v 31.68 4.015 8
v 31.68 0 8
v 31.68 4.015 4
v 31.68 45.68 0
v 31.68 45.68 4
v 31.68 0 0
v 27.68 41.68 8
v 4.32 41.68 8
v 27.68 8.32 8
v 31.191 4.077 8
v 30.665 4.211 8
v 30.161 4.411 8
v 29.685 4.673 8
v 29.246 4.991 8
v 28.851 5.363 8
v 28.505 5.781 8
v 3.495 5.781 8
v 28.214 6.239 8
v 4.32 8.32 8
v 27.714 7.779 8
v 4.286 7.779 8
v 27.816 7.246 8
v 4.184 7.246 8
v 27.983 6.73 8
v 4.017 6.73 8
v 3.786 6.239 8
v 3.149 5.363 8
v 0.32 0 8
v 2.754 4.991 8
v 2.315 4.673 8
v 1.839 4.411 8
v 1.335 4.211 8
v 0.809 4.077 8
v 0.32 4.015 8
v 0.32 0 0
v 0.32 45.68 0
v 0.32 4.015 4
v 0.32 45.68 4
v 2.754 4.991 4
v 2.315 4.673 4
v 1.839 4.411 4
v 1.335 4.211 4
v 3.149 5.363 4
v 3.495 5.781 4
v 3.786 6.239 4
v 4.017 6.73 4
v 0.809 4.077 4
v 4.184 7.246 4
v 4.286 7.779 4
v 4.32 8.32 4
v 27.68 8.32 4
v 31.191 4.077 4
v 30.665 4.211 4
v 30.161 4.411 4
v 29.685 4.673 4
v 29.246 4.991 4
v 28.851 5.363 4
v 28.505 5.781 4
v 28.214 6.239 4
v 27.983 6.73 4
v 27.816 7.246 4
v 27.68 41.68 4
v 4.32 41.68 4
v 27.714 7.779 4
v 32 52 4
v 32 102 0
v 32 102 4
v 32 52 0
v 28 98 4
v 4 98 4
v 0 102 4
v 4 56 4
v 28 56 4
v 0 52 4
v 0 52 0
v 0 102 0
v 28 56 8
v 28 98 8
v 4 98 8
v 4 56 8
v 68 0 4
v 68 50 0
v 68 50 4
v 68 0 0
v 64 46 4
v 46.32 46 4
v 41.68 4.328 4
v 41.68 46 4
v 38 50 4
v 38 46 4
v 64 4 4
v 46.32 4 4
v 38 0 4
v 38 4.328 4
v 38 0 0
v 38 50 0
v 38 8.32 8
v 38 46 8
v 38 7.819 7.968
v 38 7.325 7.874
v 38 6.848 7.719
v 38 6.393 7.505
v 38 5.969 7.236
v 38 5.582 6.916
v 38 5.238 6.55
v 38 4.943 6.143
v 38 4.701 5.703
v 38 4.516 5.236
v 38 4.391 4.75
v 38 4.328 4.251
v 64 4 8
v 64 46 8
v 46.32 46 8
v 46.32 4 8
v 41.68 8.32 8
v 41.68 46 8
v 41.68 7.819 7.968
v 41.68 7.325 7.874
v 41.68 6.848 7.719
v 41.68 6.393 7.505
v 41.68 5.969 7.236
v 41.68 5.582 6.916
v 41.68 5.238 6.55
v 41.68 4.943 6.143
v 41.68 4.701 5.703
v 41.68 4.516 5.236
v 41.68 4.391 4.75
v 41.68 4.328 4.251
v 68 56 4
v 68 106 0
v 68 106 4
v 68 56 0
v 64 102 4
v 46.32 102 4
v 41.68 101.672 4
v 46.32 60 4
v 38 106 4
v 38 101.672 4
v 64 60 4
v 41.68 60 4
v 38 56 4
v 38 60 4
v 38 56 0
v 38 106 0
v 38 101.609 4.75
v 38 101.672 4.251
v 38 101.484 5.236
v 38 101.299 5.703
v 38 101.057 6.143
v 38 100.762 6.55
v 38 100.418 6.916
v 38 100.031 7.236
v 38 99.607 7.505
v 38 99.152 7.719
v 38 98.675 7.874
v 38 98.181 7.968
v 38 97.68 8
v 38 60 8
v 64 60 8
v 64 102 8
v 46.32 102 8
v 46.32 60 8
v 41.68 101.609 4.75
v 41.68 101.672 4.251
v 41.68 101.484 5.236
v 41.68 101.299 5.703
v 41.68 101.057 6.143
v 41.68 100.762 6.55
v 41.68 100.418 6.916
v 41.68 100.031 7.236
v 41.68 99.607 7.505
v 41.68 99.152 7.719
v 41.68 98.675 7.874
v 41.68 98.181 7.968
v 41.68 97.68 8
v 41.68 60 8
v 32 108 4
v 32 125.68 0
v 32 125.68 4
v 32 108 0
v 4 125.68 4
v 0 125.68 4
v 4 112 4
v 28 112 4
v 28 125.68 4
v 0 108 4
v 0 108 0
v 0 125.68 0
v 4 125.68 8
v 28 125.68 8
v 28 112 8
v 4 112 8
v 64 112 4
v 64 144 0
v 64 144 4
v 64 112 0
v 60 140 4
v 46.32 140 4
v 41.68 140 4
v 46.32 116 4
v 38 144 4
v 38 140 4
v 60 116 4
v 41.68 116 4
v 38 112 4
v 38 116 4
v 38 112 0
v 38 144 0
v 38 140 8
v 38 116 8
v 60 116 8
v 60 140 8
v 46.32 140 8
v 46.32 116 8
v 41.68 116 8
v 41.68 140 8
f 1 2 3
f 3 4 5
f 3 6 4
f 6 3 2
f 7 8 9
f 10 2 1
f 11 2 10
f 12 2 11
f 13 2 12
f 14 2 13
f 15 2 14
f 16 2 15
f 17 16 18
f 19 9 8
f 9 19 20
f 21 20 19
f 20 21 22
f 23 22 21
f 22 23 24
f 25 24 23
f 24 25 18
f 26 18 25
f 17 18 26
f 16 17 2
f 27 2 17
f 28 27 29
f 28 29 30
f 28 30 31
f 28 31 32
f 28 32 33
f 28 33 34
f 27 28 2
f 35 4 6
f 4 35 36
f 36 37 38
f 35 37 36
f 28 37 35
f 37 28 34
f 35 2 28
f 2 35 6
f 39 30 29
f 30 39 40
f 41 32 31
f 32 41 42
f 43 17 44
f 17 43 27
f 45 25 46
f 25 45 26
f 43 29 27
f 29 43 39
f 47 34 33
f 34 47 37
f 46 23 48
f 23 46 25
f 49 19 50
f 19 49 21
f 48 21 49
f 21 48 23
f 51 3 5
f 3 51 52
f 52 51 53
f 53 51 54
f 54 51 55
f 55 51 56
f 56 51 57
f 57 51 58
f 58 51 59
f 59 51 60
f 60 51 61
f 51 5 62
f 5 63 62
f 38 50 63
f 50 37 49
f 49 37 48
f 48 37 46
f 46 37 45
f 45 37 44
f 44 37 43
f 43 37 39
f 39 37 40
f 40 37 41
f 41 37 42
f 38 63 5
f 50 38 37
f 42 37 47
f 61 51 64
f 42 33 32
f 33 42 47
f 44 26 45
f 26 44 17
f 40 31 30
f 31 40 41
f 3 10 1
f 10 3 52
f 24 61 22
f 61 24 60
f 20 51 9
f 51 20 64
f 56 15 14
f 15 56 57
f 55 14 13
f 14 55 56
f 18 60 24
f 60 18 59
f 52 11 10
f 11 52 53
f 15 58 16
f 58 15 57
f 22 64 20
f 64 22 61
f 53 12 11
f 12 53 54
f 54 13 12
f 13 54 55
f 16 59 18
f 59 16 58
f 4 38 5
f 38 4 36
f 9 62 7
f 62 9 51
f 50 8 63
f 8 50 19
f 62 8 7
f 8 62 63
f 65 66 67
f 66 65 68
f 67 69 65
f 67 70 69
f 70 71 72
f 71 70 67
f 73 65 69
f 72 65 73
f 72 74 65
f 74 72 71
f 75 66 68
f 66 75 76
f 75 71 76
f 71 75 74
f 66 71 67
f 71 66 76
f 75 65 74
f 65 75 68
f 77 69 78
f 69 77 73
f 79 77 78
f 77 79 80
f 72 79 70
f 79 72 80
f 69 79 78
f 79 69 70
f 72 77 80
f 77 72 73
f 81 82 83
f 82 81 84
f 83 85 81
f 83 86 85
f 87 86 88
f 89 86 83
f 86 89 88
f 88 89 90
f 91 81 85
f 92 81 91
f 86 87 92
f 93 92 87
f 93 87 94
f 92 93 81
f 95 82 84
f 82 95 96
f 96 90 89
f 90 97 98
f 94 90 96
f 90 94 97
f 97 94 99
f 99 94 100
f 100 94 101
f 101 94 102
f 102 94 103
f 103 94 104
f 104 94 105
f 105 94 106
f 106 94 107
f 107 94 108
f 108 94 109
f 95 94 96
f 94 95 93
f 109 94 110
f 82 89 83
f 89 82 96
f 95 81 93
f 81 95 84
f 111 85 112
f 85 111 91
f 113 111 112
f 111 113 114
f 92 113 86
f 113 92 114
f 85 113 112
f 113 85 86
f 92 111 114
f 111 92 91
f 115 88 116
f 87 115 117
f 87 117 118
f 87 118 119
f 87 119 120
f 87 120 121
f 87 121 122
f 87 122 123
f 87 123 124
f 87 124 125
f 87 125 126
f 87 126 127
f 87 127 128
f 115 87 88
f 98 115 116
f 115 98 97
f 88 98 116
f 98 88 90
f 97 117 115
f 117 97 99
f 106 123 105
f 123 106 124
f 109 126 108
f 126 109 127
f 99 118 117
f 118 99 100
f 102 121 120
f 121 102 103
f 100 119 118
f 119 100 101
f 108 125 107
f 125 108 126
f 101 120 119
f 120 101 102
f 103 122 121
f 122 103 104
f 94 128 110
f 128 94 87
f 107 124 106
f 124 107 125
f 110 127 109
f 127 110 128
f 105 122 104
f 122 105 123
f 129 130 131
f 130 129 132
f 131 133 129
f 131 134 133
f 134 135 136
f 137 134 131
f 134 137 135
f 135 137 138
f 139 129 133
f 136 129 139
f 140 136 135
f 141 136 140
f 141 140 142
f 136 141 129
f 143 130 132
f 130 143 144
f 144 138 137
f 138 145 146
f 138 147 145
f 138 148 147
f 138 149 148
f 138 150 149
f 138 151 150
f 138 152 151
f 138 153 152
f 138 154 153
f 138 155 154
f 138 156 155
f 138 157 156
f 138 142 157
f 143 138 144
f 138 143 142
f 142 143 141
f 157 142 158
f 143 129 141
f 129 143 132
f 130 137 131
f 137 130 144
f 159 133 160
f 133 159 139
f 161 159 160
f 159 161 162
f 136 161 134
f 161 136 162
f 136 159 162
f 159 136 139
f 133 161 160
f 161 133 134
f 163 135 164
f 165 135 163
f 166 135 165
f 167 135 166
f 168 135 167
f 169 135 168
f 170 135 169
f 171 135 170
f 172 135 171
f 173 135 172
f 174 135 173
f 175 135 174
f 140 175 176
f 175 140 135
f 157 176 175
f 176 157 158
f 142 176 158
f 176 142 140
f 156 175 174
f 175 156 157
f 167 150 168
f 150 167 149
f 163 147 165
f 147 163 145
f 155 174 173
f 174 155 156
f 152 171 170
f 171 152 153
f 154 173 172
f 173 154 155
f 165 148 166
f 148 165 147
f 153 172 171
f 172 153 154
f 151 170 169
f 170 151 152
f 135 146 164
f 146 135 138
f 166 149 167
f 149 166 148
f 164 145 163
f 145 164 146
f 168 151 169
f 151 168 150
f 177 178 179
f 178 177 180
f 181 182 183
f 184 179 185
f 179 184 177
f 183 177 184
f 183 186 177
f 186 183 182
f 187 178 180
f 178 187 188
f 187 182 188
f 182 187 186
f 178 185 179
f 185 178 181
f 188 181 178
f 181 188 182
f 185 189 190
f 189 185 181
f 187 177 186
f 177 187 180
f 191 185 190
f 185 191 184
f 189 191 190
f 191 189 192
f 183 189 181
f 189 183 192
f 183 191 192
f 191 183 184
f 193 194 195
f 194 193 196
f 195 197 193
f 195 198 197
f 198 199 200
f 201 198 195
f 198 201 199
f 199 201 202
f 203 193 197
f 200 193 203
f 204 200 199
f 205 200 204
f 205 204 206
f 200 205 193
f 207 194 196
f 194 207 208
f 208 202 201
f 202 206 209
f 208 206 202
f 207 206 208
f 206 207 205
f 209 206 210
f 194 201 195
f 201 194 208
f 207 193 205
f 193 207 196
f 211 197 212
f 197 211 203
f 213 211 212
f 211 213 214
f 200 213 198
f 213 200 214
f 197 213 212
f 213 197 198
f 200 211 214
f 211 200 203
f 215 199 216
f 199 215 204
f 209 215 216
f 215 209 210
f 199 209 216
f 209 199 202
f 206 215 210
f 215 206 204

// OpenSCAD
//Outside length of box in mm
length=50; 
//Outside width of box in mm
width=40; 
//Outside height of box in mm
height=30; 
//Thickness of box walls in mm.  Take this into account for desired interior dimensions.
thickness=8; 
//Tolerance affects the fit of the sliding lid.  Higher is looser.
tolerance=4;//[0:20]
//Bit is for CNC purposes.  This affects the spacing between pieces in the layout.
bit=6;
//Layout style.
layout=1;//[1:Layout1, 2:Layout2, 3:Layout3, 4:Layout4, 5:Assembled, 6:Exploded]

tlrnc=thickness*tolerance/100;

module lid() {
   translate([tlrnc,0,0]) 
      cube([width-thickness-2*tlrnc,length-thickness/2-tlrnc,thickness/2]);
   translate([thickness/2+tlrnc,thickness/2,0]) 
      cube([width-2*thickness-2*tlrnc,length-3/2*thickness-tlrnc,thickness]);
   difference() {
      translate([tlrnc,0,0]) 
         cube([width-thickness-2*tlrnc,thickness+tlrnc,thickness]); 
      translate([0,thickness+tlrnc,thickness/2]) 
         cylinder($fn=50,thickness/2+2*tlrnc,thickness/2+tlrnc,thickness/2+tlrnc); 
      translate([width-thickness,thickness+tlrnc,thickness/2-2*tlrnc]) 
         cylinder($fn=50,thickness/2+2*tlrnc,thickness/2+tlrnc,thickness/2+tlrnc); 
   } 
}

module bottom() {
   cube([width-thickness,length,thickness/2]);
   translate([thickness/2,thickness/2,0]) 
      cube([width-2*thickness,length-thickness,thickness]);
}  

module side() {
   cube([height,length,thickness/2]);
   translate([thickness+tlrnc,thickness/2,0]) 
      cube([height-3/2*thickness-tlrnc,length-thickness,thickness]);
   translate([0,thickness+tlrnc,0])
      cube([thickness/2-tlrnc,length-3/2*thickness-tlrnc,thickness]);
   translate([0,thickness+tlrnc,thickness/2]) 
      rotate([0,90,0]) 
         cylinder($fn=50,thickness/2-tlrnc,thickness/2,thickness/2); 
}  

module end() {
   cube([width-thickness,height-3/2*thickness-tlrnc,thickness/2]);
   translate([thickness/2,thickness/2,0]) cube([width-2*thickness,height-2*thickness-tlrnc,thickness]); 
}

module far_end() {
   cube([height-thickness/2,width-thickness,thickness/2]);
   translate([thickness+tlrnc,thickness/2,0]) 
      cube([height-2*thickness-tlrnc,width-2*thickness,thickness]); 
   translate([0,thickness/2,0])
      cube([thickness/2-tlrnc,width-2*thickness,thickness]);  
}


module box_layout_1 () {
// good for more cubicle boxes.    
   lid();
   translate([0,length-thickness/2+bit,0]) bottom();
   translate([width-thickness+bit,0,0]) side();
   translate([width-thickness+bit,2*length+bit,0]) mirror([0,1,0]) side();
   translate([0,2*length-thickness/2+2*bit,0]) end();
   translate([width-thickness+bit,2*length+2*bit,0]) far_end();
}  

module box_layout_2 () {
// good for longer boxes such as would hold a wine bottle on its side.   
   lid();
   translate([length+bit,height+bit,0]) bottom();
   translate([length+width-thickness+bit,0,0])rotate([0,0,90])side();
   translate([length,length+height+bit,0]) rotate([0,0,-90])mirror([0,1,0]) side();
   translate([width/2+length/2-bit/2-thickness/2,length/2-width/2+height/2+thickness,0]) rotate([0,0,90])end();
   translate([width/2+length/2+bit/2-thickness/2,length/2-width/2+height/2+thickness,0])                 far_end();
}

module box_layout_3 () {
// good for tall boxes.
   lid();
   translate([0,length-thickness/2+bit,0]) bottom();
   translate([width-thickness+bit,0,0]) side();
   translate([width-thickness+bit,2*length+bit,0]) mirror([0,1,0]) side();
   translate([width-thickness+bit,2*length+2*bit,0])far_end();
   translate([width-thickness/2+bit,2*width-2*thickness+2*length+3*bit,1])rotate([0,0,-90])end();
}  

module box_layout_4 () {
// good for pizza box shaped boxes.
   lid();
   translate([0,length-thickness/2+bit,0]) bottom();
   translate([0,height+2*length-thickness/2+2*bit,0]) rotate([0,0,-90])side();
   translate([0,height+2*length-thickness/2+3*bit,0]) rotate([0,0,90])mirror([0,1,0]) side();
   translate([0,3*height-3/2*thickness/2+2*length+4*bit,0])rotate([0,0,-90])far_end();
   translate([0,3*height-3/2*thickness/2+2*length+5*bit,0])end();
}  

module assembled_box() {
   translate([0,0,height-thickness]) lid();
   translate([0,0,0]) bottom();
   translate([-thickness/2,0,height]) rotate([0,90,0]) side();
   translate([width-thickness/2,0,height]) rotate([180,90,0])mirror([0,1,0]) side();
   translate([0,length,height]) rotate([90,0,0])rotate([0,0,-90])far_end();
   translate([width-thickness,0,thickness/2]) rotate([90,0,180])end();
}   

module exploded_box() {
   translate([0,0,height]) lid();
   translate([0,0,-thickness]) bottom();
   translate([-3/2*thickness,0,height]) rotate([0,90,0]) side();
   translate([width+thickness/2,0,height]) rotate([180,90,0])mirror([0,1,0]) side();
   translate([0,length+thickness,height]) rotate([90,0,0])rotate([0,0,-90])far_end();
   translate([width-thickness,-thickness,thickness/2]) rotate([90,0,180])end();
} 

if(layout==1) box_layout_1();
if(layout==2) box_layout_2();
if(layout==3) box_layout_3();
if(layout==4) box_layout_4();
if(layout==5) assembled_box();  
if(layout==6) exploded_box();
